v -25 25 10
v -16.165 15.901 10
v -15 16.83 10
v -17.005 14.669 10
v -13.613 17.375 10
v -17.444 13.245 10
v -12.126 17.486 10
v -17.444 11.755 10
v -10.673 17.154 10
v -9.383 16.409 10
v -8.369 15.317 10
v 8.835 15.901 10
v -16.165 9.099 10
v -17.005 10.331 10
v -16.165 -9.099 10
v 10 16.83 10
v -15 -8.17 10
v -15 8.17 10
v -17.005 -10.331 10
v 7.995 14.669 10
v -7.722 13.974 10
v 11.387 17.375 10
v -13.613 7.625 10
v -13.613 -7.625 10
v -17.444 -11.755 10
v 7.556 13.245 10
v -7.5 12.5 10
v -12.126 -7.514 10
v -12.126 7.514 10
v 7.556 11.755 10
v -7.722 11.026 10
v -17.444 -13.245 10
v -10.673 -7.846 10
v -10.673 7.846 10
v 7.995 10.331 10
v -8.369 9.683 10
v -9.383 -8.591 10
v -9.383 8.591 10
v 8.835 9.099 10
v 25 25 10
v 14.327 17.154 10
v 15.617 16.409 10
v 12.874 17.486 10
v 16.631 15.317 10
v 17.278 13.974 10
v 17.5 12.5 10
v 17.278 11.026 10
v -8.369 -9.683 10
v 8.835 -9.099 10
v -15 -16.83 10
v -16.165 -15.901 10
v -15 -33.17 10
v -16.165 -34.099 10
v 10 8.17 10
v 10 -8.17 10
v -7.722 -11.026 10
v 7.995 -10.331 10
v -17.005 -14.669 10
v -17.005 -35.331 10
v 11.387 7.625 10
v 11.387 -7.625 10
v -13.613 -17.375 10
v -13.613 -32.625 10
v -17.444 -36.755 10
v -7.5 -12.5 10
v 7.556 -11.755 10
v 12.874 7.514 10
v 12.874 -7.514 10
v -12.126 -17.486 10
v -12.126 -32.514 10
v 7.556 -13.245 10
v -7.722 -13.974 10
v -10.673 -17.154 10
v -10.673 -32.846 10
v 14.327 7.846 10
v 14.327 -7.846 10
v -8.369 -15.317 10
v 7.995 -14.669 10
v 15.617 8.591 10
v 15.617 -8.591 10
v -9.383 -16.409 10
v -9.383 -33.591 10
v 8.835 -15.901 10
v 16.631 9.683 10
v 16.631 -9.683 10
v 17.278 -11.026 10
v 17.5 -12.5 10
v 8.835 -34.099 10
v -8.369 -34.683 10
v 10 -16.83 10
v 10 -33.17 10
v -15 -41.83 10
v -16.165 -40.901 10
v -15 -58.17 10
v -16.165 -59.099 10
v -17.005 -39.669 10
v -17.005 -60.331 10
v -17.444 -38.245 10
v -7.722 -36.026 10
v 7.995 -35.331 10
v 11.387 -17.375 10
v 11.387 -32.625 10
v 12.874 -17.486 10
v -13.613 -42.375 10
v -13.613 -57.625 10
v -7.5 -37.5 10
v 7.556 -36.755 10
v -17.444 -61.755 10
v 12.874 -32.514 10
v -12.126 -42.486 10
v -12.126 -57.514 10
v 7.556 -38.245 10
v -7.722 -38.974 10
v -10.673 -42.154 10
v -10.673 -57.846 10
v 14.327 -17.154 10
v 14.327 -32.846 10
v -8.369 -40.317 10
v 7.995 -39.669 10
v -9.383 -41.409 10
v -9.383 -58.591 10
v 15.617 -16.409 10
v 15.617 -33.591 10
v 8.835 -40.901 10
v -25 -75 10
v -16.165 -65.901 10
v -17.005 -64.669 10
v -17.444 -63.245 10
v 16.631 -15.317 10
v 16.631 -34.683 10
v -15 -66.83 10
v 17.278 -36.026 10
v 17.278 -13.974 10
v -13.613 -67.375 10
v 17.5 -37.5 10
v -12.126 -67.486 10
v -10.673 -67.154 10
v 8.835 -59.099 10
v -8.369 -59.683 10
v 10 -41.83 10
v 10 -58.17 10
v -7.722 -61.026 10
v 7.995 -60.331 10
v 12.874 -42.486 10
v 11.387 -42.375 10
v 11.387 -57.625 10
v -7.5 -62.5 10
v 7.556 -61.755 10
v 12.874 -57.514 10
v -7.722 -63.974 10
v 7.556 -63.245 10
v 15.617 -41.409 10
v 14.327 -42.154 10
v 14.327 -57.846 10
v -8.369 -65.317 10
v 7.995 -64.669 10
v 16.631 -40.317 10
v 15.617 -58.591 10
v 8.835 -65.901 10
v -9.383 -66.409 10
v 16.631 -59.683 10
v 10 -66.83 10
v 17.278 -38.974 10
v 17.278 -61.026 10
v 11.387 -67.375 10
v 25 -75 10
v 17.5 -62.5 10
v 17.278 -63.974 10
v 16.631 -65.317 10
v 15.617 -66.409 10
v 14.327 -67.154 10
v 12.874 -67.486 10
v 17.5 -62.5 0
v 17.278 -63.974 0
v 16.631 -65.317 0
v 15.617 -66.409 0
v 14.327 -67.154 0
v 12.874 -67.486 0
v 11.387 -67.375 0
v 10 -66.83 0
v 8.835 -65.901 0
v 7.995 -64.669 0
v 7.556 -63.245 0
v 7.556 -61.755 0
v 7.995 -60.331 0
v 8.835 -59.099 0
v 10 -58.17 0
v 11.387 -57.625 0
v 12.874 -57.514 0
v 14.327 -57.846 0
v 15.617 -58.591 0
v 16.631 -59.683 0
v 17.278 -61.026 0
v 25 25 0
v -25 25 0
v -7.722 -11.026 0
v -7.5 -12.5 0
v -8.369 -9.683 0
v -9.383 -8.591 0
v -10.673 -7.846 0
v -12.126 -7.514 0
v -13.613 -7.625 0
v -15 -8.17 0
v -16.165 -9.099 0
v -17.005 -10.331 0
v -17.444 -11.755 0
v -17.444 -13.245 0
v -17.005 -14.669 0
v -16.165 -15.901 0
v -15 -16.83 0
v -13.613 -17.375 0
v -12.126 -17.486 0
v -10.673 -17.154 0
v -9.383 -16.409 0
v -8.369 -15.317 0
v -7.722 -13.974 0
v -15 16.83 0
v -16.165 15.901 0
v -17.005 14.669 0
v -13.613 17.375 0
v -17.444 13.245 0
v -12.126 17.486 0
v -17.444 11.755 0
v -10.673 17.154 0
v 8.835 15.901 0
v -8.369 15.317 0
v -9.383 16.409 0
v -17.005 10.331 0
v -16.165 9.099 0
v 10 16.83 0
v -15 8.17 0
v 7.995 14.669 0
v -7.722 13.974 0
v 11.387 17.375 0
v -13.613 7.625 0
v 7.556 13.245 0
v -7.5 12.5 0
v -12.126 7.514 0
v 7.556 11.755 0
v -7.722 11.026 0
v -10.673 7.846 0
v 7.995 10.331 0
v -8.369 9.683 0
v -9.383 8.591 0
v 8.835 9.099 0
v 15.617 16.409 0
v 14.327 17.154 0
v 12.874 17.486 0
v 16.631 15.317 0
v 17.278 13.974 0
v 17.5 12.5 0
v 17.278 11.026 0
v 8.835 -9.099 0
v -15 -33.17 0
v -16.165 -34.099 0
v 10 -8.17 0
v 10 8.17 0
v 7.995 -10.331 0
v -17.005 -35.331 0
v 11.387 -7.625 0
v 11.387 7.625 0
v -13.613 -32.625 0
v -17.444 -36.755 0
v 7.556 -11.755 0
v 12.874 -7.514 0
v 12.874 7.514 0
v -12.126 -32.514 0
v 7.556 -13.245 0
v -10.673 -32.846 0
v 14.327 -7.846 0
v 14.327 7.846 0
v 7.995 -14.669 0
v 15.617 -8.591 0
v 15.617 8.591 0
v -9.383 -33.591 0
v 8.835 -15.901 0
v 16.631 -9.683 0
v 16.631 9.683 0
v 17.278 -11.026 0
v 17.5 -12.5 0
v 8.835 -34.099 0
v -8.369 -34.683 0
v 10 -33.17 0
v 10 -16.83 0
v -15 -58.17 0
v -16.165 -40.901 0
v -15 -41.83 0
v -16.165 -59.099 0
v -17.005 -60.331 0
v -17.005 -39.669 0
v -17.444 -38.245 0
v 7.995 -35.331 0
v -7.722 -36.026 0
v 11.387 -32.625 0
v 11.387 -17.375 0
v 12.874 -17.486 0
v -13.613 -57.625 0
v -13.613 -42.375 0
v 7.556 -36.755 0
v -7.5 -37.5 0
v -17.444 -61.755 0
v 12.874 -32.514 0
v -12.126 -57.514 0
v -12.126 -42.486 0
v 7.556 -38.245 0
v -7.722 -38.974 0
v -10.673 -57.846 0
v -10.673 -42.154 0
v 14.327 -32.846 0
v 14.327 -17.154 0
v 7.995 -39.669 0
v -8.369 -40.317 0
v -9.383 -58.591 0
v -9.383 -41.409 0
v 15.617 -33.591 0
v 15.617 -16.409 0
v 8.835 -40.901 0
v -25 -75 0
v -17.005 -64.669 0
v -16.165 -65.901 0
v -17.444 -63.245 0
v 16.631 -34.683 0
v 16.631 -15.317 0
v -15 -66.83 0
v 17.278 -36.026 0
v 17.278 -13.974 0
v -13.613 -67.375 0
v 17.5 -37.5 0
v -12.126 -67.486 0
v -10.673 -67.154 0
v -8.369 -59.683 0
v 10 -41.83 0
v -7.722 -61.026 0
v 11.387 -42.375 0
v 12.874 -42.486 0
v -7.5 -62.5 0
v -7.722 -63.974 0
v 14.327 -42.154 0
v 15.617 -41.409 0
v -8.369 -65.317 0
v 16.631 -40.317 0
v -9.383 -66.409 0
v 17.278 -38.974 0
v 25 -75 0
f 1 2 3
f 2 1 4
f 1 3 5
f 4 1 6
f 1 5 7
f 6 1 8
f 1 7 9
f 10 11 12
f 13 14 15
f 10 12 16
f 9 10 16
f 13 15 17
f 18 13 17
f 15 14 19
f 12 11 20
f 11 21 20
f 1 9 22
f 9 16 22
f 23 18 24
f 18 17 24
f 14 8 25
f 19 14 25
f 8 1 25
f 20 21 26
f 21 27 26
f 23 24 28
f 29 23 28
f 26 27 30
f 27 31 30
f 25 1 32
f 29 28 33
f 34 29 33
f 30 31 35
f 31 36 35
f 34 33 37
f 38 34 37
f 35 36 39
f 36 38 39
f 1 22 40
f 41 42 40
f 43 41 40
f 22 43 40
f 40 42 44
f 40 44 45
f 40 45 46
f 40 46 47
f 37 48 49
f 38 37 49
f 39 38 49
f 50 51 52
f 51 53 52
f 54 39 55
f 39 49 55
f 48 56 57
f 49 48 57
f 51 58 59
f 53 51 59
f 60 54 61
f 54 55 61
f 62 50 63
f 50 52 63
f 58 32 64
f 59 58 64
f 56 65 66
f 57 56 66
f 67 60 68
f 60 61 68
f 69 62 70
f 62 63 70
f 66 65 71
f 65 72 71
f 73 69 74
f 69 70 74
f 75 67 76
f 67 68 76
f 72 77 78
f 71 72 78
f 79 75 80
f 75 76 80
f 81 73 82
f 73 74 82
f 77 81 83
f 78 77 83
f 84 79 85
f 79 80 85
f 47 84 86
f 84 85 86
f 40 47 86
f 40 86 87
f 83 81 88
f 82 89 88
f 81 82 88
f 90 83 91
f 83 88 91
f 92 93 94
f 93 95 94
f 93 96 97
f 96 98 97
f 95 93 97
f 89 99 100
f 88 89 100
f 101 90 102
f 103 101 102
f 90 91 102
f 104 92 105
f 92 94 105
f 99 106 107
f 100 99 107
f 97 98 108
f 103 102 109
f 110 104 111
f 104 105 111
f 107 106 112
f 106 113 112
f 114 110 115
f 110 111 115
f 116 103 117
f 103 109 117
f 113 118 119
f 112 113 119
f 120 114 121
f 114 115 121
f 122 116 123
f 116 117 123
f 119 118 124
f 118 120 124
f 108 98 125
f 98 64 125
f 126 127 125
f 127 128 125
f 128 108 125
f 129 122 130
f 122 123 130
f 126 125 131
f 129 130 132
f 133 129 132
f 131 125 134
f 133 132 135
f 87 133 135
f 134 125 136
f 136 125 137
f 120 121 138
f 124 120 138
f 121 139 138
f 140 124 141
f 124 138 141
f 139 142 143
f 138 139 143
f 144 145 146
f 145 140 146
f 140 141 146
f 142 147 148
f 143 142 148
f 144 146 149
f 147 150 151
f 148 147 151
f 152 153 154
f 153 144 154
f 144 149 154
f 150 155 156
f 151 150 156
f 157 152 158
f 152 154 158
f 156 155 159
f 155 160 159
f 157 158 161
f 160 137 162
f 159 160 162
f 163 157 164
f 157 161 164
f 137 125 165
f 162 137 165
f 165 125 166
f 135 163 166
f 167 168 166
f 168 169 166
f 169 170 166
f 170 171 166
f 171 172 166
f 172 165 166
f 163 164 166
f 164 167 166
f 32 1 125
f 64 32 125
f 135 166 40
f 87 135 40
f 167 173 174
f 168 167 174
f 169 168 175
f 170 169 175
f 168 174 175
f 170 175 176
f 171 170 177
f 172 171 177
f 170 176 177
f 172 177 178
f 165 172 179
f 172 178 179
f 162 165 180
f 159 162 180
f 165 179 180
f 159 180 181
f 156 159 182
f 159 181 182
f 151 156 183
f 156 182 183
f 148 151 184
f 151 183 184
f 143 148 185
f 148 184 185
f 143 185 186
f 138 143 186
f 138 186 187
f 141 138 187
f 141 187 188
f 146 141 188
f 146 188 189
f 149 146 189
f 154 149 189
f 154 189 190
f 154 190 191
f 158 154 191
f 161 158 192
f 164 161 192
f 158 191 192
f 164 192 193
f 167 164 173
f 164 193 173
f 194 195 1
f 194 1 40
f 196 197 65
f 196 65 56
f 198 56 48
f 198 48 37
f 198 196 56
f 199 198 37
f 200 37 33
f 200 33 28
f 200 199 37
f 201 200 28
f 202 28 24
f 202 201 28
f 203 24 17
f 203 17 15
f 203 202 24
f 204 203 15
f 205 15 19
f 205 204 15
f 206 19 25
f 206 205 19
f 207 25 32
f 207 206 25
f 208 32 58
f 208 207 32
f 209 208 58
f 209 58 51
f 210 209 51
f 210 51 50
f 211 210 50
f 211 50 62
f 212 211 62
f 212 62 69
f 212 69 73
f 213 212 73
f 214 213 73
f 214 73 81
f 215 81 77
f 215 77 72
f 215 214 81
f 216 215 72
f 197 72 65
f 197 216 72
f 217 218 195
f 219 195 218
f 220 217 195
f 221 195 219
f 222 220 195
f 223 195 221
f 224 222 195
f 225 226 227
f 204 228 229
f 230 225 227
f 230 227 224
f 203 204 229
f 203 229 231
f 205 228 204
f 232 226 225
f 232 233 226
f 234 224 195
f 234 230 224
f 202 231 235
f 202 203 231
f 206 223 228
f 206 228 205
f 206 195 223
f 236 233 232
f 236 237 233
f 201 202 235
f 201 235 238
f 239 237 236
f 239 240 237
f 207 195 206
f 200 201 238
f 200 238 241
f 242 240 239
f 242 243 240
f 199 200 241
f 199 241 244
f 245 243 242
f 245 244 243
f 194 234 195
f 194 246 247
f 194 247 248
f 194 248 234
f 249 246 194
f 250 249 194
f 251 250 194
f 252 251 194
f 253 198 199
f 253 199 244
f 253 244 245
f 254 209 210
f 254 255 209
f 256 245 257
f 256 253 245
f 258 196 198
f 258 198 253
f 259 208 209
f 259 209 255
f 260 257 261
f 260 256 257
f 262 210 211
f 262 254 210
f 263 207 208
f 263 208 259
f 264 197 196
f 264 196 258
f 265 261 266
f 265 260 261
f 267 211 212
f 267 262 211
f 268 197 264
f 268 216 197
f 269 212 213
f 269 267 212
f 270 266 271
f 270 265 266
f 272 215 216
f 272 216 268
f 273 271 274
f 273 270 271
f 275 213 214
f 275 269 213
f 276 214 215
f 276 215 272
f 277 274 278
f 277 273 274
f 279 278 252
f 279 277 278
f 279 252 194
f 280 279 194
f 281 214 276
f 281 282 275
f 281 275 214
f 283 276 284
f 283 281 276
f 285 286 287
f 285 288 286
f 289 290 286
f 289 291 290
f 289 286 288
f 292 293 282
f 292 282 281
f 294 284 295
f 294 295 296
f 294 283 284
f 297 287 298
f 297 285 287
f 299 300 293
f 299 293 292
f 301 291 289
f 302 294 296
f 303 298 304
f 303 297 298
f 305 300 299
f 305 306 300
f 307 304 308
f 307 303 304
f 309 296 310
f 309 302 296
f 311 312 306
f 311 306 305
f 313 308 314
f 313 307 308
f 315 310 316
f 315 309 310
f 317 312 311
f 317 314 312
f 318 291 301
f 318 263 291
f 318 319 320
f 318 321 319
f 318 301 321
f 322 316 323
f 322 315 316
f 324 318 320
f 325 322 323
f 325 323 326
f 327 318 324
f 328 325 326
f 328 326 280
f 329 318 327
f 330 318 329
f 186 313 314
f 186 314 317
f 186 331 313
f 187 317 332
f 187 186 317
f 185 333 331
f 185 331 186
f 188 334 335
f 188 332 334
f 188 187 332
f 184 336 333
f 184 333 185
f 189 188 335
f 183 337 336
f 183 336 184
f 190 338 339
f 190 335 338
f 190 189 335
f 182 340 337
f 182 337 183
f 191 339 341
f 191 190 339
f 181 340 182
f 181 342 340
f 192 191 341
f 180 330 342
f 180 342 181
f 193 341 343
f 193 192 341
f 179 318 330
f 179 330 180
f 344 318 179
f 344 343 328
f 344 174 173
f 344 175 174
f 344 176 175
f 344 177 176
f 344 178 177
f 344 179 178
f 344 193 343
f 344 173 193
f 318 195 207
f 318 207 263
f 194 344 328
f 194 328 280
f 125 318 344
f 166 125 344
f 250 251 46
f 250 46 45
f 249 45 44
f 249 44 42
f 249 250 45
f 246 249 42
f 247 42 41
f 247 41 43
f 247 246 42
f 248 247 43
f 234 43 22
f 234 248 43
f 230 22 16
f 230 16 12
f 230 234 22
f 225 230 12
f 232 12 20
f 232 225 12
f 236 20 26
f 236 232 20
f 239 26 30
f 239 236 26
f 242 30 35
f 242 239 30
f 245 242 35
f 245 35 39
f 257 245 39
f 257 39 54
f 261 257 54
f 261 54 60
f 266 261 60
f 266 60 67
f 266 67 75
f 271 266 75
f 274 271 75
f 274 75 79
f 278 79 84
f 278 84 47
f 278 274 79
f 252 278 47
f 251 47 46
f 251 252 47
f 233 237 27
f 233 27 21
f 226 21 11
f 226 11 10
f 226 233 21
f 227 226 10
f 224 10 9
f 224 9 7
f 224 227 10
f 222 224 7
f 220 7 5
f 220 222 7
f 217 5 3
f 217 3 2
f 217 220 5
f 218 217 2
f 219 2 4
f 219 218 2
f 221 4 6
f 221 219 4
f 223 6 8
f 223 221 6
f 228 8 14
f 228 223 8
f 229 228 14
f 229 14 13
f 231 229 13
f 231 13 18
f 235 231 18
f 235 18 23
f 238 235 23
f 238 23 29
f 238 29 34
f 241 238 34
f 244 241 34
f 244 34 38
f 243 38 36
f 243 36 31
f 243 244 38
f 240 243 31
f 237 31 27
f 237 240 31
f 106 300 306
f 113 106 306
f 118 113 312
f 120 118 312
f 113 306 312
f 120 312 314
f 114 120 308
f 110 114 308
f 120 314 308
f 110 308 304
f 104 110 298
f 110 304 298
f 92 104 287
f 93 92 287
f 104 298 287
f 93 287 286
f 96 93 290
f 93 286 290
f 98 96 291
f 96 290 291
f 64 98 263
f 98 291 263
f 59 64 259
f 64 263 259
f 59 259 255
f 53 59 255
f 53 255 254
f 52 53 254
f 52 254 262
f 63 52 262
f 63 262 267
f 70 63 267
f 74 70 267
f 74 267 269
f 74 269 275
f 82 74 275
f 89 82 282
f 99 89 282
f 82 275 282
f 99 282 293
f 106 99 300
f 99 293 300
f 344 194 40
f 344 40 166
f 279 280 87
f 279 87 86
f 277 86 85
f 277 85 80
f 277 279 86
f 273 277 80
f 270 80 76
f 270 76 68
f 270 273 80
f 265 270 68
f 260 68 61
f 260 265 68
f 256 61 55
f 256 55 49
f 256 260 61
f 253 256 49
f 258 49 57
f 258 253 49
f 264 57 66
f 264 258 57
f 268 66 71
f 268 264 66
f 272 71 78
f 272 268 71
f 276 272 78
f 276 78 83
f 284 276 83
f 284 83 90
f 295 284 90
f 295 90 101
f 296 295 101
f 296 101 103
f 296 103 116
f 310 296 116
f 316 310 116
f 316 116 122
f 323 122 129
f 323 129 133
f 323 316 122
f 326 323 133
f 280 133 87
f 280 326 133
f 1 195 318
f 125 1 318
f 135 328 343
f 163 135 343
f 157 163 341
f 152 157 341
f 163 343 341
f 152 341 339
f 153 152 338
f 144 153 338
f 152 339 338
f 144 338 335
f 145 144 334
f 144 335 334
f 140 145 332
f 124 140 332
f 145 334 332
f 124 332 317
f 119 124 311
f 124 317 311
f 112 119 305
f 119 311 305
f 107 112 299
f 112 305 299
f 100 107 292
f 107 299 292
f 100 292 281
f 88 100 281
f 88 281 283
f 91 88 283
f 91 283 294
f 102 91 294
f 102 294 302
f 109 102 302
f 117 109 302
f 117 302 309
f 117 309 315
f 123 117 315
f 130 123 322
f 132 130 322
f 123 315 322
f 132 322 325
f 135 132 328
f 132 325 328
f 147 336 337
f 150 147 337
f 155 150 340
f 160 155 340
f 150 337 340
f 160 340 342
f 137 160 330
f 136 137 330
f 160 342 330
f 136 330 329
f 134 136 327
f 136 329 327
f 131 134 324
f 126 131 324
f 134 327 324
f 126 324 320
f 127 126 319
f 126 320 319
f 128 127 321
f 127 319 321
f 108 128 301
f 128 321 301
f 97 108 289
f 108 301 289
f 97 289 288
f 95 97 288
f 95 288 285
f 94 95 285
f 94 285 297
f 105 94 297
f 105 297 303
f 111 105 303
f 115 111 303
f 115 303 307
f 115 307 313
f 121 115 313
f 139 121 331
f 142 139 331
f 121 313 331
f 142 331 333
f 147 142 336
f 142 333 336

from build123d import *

# Parameters (mm, degrees)
SKETCH_W  = 50
SKETCH_H  = 50
SKETCH_R  = 5
PAD_DEPTH = 10


with BuildPart() as part:
    # Sketch → Pad (new body)
    with BuildSketch(Plane.XY):
        Rectangle(SKETCH_W, SKETCH_H)
        with Locations((12.5, 12.5)):
            Circle(SKETCH_R, mode=Mode.SUBTRACT)
        with Locations((-12.5, 12.5)):
            Circle(SKETCH_R, mode=Mode.SUBTRACT)
        with Locations((-12.5, -12.5)):
            Circle(SKETCH_R, mode=Mode.SUBTRACT)
        with Locations((12.5, -12.5)):
            Circle(SKETCH_R, mode=Mode.SUBTRACT)
    pad = extrude(amount=PAD_DEPTH)

    # Mirrored: Pad across face of Pad
    add(pad.mirror(Plane(origin=(0, -25, 5), x_dir=(1, 0, 0), z_dir=(0, -1, 0))))


solid = part.part
